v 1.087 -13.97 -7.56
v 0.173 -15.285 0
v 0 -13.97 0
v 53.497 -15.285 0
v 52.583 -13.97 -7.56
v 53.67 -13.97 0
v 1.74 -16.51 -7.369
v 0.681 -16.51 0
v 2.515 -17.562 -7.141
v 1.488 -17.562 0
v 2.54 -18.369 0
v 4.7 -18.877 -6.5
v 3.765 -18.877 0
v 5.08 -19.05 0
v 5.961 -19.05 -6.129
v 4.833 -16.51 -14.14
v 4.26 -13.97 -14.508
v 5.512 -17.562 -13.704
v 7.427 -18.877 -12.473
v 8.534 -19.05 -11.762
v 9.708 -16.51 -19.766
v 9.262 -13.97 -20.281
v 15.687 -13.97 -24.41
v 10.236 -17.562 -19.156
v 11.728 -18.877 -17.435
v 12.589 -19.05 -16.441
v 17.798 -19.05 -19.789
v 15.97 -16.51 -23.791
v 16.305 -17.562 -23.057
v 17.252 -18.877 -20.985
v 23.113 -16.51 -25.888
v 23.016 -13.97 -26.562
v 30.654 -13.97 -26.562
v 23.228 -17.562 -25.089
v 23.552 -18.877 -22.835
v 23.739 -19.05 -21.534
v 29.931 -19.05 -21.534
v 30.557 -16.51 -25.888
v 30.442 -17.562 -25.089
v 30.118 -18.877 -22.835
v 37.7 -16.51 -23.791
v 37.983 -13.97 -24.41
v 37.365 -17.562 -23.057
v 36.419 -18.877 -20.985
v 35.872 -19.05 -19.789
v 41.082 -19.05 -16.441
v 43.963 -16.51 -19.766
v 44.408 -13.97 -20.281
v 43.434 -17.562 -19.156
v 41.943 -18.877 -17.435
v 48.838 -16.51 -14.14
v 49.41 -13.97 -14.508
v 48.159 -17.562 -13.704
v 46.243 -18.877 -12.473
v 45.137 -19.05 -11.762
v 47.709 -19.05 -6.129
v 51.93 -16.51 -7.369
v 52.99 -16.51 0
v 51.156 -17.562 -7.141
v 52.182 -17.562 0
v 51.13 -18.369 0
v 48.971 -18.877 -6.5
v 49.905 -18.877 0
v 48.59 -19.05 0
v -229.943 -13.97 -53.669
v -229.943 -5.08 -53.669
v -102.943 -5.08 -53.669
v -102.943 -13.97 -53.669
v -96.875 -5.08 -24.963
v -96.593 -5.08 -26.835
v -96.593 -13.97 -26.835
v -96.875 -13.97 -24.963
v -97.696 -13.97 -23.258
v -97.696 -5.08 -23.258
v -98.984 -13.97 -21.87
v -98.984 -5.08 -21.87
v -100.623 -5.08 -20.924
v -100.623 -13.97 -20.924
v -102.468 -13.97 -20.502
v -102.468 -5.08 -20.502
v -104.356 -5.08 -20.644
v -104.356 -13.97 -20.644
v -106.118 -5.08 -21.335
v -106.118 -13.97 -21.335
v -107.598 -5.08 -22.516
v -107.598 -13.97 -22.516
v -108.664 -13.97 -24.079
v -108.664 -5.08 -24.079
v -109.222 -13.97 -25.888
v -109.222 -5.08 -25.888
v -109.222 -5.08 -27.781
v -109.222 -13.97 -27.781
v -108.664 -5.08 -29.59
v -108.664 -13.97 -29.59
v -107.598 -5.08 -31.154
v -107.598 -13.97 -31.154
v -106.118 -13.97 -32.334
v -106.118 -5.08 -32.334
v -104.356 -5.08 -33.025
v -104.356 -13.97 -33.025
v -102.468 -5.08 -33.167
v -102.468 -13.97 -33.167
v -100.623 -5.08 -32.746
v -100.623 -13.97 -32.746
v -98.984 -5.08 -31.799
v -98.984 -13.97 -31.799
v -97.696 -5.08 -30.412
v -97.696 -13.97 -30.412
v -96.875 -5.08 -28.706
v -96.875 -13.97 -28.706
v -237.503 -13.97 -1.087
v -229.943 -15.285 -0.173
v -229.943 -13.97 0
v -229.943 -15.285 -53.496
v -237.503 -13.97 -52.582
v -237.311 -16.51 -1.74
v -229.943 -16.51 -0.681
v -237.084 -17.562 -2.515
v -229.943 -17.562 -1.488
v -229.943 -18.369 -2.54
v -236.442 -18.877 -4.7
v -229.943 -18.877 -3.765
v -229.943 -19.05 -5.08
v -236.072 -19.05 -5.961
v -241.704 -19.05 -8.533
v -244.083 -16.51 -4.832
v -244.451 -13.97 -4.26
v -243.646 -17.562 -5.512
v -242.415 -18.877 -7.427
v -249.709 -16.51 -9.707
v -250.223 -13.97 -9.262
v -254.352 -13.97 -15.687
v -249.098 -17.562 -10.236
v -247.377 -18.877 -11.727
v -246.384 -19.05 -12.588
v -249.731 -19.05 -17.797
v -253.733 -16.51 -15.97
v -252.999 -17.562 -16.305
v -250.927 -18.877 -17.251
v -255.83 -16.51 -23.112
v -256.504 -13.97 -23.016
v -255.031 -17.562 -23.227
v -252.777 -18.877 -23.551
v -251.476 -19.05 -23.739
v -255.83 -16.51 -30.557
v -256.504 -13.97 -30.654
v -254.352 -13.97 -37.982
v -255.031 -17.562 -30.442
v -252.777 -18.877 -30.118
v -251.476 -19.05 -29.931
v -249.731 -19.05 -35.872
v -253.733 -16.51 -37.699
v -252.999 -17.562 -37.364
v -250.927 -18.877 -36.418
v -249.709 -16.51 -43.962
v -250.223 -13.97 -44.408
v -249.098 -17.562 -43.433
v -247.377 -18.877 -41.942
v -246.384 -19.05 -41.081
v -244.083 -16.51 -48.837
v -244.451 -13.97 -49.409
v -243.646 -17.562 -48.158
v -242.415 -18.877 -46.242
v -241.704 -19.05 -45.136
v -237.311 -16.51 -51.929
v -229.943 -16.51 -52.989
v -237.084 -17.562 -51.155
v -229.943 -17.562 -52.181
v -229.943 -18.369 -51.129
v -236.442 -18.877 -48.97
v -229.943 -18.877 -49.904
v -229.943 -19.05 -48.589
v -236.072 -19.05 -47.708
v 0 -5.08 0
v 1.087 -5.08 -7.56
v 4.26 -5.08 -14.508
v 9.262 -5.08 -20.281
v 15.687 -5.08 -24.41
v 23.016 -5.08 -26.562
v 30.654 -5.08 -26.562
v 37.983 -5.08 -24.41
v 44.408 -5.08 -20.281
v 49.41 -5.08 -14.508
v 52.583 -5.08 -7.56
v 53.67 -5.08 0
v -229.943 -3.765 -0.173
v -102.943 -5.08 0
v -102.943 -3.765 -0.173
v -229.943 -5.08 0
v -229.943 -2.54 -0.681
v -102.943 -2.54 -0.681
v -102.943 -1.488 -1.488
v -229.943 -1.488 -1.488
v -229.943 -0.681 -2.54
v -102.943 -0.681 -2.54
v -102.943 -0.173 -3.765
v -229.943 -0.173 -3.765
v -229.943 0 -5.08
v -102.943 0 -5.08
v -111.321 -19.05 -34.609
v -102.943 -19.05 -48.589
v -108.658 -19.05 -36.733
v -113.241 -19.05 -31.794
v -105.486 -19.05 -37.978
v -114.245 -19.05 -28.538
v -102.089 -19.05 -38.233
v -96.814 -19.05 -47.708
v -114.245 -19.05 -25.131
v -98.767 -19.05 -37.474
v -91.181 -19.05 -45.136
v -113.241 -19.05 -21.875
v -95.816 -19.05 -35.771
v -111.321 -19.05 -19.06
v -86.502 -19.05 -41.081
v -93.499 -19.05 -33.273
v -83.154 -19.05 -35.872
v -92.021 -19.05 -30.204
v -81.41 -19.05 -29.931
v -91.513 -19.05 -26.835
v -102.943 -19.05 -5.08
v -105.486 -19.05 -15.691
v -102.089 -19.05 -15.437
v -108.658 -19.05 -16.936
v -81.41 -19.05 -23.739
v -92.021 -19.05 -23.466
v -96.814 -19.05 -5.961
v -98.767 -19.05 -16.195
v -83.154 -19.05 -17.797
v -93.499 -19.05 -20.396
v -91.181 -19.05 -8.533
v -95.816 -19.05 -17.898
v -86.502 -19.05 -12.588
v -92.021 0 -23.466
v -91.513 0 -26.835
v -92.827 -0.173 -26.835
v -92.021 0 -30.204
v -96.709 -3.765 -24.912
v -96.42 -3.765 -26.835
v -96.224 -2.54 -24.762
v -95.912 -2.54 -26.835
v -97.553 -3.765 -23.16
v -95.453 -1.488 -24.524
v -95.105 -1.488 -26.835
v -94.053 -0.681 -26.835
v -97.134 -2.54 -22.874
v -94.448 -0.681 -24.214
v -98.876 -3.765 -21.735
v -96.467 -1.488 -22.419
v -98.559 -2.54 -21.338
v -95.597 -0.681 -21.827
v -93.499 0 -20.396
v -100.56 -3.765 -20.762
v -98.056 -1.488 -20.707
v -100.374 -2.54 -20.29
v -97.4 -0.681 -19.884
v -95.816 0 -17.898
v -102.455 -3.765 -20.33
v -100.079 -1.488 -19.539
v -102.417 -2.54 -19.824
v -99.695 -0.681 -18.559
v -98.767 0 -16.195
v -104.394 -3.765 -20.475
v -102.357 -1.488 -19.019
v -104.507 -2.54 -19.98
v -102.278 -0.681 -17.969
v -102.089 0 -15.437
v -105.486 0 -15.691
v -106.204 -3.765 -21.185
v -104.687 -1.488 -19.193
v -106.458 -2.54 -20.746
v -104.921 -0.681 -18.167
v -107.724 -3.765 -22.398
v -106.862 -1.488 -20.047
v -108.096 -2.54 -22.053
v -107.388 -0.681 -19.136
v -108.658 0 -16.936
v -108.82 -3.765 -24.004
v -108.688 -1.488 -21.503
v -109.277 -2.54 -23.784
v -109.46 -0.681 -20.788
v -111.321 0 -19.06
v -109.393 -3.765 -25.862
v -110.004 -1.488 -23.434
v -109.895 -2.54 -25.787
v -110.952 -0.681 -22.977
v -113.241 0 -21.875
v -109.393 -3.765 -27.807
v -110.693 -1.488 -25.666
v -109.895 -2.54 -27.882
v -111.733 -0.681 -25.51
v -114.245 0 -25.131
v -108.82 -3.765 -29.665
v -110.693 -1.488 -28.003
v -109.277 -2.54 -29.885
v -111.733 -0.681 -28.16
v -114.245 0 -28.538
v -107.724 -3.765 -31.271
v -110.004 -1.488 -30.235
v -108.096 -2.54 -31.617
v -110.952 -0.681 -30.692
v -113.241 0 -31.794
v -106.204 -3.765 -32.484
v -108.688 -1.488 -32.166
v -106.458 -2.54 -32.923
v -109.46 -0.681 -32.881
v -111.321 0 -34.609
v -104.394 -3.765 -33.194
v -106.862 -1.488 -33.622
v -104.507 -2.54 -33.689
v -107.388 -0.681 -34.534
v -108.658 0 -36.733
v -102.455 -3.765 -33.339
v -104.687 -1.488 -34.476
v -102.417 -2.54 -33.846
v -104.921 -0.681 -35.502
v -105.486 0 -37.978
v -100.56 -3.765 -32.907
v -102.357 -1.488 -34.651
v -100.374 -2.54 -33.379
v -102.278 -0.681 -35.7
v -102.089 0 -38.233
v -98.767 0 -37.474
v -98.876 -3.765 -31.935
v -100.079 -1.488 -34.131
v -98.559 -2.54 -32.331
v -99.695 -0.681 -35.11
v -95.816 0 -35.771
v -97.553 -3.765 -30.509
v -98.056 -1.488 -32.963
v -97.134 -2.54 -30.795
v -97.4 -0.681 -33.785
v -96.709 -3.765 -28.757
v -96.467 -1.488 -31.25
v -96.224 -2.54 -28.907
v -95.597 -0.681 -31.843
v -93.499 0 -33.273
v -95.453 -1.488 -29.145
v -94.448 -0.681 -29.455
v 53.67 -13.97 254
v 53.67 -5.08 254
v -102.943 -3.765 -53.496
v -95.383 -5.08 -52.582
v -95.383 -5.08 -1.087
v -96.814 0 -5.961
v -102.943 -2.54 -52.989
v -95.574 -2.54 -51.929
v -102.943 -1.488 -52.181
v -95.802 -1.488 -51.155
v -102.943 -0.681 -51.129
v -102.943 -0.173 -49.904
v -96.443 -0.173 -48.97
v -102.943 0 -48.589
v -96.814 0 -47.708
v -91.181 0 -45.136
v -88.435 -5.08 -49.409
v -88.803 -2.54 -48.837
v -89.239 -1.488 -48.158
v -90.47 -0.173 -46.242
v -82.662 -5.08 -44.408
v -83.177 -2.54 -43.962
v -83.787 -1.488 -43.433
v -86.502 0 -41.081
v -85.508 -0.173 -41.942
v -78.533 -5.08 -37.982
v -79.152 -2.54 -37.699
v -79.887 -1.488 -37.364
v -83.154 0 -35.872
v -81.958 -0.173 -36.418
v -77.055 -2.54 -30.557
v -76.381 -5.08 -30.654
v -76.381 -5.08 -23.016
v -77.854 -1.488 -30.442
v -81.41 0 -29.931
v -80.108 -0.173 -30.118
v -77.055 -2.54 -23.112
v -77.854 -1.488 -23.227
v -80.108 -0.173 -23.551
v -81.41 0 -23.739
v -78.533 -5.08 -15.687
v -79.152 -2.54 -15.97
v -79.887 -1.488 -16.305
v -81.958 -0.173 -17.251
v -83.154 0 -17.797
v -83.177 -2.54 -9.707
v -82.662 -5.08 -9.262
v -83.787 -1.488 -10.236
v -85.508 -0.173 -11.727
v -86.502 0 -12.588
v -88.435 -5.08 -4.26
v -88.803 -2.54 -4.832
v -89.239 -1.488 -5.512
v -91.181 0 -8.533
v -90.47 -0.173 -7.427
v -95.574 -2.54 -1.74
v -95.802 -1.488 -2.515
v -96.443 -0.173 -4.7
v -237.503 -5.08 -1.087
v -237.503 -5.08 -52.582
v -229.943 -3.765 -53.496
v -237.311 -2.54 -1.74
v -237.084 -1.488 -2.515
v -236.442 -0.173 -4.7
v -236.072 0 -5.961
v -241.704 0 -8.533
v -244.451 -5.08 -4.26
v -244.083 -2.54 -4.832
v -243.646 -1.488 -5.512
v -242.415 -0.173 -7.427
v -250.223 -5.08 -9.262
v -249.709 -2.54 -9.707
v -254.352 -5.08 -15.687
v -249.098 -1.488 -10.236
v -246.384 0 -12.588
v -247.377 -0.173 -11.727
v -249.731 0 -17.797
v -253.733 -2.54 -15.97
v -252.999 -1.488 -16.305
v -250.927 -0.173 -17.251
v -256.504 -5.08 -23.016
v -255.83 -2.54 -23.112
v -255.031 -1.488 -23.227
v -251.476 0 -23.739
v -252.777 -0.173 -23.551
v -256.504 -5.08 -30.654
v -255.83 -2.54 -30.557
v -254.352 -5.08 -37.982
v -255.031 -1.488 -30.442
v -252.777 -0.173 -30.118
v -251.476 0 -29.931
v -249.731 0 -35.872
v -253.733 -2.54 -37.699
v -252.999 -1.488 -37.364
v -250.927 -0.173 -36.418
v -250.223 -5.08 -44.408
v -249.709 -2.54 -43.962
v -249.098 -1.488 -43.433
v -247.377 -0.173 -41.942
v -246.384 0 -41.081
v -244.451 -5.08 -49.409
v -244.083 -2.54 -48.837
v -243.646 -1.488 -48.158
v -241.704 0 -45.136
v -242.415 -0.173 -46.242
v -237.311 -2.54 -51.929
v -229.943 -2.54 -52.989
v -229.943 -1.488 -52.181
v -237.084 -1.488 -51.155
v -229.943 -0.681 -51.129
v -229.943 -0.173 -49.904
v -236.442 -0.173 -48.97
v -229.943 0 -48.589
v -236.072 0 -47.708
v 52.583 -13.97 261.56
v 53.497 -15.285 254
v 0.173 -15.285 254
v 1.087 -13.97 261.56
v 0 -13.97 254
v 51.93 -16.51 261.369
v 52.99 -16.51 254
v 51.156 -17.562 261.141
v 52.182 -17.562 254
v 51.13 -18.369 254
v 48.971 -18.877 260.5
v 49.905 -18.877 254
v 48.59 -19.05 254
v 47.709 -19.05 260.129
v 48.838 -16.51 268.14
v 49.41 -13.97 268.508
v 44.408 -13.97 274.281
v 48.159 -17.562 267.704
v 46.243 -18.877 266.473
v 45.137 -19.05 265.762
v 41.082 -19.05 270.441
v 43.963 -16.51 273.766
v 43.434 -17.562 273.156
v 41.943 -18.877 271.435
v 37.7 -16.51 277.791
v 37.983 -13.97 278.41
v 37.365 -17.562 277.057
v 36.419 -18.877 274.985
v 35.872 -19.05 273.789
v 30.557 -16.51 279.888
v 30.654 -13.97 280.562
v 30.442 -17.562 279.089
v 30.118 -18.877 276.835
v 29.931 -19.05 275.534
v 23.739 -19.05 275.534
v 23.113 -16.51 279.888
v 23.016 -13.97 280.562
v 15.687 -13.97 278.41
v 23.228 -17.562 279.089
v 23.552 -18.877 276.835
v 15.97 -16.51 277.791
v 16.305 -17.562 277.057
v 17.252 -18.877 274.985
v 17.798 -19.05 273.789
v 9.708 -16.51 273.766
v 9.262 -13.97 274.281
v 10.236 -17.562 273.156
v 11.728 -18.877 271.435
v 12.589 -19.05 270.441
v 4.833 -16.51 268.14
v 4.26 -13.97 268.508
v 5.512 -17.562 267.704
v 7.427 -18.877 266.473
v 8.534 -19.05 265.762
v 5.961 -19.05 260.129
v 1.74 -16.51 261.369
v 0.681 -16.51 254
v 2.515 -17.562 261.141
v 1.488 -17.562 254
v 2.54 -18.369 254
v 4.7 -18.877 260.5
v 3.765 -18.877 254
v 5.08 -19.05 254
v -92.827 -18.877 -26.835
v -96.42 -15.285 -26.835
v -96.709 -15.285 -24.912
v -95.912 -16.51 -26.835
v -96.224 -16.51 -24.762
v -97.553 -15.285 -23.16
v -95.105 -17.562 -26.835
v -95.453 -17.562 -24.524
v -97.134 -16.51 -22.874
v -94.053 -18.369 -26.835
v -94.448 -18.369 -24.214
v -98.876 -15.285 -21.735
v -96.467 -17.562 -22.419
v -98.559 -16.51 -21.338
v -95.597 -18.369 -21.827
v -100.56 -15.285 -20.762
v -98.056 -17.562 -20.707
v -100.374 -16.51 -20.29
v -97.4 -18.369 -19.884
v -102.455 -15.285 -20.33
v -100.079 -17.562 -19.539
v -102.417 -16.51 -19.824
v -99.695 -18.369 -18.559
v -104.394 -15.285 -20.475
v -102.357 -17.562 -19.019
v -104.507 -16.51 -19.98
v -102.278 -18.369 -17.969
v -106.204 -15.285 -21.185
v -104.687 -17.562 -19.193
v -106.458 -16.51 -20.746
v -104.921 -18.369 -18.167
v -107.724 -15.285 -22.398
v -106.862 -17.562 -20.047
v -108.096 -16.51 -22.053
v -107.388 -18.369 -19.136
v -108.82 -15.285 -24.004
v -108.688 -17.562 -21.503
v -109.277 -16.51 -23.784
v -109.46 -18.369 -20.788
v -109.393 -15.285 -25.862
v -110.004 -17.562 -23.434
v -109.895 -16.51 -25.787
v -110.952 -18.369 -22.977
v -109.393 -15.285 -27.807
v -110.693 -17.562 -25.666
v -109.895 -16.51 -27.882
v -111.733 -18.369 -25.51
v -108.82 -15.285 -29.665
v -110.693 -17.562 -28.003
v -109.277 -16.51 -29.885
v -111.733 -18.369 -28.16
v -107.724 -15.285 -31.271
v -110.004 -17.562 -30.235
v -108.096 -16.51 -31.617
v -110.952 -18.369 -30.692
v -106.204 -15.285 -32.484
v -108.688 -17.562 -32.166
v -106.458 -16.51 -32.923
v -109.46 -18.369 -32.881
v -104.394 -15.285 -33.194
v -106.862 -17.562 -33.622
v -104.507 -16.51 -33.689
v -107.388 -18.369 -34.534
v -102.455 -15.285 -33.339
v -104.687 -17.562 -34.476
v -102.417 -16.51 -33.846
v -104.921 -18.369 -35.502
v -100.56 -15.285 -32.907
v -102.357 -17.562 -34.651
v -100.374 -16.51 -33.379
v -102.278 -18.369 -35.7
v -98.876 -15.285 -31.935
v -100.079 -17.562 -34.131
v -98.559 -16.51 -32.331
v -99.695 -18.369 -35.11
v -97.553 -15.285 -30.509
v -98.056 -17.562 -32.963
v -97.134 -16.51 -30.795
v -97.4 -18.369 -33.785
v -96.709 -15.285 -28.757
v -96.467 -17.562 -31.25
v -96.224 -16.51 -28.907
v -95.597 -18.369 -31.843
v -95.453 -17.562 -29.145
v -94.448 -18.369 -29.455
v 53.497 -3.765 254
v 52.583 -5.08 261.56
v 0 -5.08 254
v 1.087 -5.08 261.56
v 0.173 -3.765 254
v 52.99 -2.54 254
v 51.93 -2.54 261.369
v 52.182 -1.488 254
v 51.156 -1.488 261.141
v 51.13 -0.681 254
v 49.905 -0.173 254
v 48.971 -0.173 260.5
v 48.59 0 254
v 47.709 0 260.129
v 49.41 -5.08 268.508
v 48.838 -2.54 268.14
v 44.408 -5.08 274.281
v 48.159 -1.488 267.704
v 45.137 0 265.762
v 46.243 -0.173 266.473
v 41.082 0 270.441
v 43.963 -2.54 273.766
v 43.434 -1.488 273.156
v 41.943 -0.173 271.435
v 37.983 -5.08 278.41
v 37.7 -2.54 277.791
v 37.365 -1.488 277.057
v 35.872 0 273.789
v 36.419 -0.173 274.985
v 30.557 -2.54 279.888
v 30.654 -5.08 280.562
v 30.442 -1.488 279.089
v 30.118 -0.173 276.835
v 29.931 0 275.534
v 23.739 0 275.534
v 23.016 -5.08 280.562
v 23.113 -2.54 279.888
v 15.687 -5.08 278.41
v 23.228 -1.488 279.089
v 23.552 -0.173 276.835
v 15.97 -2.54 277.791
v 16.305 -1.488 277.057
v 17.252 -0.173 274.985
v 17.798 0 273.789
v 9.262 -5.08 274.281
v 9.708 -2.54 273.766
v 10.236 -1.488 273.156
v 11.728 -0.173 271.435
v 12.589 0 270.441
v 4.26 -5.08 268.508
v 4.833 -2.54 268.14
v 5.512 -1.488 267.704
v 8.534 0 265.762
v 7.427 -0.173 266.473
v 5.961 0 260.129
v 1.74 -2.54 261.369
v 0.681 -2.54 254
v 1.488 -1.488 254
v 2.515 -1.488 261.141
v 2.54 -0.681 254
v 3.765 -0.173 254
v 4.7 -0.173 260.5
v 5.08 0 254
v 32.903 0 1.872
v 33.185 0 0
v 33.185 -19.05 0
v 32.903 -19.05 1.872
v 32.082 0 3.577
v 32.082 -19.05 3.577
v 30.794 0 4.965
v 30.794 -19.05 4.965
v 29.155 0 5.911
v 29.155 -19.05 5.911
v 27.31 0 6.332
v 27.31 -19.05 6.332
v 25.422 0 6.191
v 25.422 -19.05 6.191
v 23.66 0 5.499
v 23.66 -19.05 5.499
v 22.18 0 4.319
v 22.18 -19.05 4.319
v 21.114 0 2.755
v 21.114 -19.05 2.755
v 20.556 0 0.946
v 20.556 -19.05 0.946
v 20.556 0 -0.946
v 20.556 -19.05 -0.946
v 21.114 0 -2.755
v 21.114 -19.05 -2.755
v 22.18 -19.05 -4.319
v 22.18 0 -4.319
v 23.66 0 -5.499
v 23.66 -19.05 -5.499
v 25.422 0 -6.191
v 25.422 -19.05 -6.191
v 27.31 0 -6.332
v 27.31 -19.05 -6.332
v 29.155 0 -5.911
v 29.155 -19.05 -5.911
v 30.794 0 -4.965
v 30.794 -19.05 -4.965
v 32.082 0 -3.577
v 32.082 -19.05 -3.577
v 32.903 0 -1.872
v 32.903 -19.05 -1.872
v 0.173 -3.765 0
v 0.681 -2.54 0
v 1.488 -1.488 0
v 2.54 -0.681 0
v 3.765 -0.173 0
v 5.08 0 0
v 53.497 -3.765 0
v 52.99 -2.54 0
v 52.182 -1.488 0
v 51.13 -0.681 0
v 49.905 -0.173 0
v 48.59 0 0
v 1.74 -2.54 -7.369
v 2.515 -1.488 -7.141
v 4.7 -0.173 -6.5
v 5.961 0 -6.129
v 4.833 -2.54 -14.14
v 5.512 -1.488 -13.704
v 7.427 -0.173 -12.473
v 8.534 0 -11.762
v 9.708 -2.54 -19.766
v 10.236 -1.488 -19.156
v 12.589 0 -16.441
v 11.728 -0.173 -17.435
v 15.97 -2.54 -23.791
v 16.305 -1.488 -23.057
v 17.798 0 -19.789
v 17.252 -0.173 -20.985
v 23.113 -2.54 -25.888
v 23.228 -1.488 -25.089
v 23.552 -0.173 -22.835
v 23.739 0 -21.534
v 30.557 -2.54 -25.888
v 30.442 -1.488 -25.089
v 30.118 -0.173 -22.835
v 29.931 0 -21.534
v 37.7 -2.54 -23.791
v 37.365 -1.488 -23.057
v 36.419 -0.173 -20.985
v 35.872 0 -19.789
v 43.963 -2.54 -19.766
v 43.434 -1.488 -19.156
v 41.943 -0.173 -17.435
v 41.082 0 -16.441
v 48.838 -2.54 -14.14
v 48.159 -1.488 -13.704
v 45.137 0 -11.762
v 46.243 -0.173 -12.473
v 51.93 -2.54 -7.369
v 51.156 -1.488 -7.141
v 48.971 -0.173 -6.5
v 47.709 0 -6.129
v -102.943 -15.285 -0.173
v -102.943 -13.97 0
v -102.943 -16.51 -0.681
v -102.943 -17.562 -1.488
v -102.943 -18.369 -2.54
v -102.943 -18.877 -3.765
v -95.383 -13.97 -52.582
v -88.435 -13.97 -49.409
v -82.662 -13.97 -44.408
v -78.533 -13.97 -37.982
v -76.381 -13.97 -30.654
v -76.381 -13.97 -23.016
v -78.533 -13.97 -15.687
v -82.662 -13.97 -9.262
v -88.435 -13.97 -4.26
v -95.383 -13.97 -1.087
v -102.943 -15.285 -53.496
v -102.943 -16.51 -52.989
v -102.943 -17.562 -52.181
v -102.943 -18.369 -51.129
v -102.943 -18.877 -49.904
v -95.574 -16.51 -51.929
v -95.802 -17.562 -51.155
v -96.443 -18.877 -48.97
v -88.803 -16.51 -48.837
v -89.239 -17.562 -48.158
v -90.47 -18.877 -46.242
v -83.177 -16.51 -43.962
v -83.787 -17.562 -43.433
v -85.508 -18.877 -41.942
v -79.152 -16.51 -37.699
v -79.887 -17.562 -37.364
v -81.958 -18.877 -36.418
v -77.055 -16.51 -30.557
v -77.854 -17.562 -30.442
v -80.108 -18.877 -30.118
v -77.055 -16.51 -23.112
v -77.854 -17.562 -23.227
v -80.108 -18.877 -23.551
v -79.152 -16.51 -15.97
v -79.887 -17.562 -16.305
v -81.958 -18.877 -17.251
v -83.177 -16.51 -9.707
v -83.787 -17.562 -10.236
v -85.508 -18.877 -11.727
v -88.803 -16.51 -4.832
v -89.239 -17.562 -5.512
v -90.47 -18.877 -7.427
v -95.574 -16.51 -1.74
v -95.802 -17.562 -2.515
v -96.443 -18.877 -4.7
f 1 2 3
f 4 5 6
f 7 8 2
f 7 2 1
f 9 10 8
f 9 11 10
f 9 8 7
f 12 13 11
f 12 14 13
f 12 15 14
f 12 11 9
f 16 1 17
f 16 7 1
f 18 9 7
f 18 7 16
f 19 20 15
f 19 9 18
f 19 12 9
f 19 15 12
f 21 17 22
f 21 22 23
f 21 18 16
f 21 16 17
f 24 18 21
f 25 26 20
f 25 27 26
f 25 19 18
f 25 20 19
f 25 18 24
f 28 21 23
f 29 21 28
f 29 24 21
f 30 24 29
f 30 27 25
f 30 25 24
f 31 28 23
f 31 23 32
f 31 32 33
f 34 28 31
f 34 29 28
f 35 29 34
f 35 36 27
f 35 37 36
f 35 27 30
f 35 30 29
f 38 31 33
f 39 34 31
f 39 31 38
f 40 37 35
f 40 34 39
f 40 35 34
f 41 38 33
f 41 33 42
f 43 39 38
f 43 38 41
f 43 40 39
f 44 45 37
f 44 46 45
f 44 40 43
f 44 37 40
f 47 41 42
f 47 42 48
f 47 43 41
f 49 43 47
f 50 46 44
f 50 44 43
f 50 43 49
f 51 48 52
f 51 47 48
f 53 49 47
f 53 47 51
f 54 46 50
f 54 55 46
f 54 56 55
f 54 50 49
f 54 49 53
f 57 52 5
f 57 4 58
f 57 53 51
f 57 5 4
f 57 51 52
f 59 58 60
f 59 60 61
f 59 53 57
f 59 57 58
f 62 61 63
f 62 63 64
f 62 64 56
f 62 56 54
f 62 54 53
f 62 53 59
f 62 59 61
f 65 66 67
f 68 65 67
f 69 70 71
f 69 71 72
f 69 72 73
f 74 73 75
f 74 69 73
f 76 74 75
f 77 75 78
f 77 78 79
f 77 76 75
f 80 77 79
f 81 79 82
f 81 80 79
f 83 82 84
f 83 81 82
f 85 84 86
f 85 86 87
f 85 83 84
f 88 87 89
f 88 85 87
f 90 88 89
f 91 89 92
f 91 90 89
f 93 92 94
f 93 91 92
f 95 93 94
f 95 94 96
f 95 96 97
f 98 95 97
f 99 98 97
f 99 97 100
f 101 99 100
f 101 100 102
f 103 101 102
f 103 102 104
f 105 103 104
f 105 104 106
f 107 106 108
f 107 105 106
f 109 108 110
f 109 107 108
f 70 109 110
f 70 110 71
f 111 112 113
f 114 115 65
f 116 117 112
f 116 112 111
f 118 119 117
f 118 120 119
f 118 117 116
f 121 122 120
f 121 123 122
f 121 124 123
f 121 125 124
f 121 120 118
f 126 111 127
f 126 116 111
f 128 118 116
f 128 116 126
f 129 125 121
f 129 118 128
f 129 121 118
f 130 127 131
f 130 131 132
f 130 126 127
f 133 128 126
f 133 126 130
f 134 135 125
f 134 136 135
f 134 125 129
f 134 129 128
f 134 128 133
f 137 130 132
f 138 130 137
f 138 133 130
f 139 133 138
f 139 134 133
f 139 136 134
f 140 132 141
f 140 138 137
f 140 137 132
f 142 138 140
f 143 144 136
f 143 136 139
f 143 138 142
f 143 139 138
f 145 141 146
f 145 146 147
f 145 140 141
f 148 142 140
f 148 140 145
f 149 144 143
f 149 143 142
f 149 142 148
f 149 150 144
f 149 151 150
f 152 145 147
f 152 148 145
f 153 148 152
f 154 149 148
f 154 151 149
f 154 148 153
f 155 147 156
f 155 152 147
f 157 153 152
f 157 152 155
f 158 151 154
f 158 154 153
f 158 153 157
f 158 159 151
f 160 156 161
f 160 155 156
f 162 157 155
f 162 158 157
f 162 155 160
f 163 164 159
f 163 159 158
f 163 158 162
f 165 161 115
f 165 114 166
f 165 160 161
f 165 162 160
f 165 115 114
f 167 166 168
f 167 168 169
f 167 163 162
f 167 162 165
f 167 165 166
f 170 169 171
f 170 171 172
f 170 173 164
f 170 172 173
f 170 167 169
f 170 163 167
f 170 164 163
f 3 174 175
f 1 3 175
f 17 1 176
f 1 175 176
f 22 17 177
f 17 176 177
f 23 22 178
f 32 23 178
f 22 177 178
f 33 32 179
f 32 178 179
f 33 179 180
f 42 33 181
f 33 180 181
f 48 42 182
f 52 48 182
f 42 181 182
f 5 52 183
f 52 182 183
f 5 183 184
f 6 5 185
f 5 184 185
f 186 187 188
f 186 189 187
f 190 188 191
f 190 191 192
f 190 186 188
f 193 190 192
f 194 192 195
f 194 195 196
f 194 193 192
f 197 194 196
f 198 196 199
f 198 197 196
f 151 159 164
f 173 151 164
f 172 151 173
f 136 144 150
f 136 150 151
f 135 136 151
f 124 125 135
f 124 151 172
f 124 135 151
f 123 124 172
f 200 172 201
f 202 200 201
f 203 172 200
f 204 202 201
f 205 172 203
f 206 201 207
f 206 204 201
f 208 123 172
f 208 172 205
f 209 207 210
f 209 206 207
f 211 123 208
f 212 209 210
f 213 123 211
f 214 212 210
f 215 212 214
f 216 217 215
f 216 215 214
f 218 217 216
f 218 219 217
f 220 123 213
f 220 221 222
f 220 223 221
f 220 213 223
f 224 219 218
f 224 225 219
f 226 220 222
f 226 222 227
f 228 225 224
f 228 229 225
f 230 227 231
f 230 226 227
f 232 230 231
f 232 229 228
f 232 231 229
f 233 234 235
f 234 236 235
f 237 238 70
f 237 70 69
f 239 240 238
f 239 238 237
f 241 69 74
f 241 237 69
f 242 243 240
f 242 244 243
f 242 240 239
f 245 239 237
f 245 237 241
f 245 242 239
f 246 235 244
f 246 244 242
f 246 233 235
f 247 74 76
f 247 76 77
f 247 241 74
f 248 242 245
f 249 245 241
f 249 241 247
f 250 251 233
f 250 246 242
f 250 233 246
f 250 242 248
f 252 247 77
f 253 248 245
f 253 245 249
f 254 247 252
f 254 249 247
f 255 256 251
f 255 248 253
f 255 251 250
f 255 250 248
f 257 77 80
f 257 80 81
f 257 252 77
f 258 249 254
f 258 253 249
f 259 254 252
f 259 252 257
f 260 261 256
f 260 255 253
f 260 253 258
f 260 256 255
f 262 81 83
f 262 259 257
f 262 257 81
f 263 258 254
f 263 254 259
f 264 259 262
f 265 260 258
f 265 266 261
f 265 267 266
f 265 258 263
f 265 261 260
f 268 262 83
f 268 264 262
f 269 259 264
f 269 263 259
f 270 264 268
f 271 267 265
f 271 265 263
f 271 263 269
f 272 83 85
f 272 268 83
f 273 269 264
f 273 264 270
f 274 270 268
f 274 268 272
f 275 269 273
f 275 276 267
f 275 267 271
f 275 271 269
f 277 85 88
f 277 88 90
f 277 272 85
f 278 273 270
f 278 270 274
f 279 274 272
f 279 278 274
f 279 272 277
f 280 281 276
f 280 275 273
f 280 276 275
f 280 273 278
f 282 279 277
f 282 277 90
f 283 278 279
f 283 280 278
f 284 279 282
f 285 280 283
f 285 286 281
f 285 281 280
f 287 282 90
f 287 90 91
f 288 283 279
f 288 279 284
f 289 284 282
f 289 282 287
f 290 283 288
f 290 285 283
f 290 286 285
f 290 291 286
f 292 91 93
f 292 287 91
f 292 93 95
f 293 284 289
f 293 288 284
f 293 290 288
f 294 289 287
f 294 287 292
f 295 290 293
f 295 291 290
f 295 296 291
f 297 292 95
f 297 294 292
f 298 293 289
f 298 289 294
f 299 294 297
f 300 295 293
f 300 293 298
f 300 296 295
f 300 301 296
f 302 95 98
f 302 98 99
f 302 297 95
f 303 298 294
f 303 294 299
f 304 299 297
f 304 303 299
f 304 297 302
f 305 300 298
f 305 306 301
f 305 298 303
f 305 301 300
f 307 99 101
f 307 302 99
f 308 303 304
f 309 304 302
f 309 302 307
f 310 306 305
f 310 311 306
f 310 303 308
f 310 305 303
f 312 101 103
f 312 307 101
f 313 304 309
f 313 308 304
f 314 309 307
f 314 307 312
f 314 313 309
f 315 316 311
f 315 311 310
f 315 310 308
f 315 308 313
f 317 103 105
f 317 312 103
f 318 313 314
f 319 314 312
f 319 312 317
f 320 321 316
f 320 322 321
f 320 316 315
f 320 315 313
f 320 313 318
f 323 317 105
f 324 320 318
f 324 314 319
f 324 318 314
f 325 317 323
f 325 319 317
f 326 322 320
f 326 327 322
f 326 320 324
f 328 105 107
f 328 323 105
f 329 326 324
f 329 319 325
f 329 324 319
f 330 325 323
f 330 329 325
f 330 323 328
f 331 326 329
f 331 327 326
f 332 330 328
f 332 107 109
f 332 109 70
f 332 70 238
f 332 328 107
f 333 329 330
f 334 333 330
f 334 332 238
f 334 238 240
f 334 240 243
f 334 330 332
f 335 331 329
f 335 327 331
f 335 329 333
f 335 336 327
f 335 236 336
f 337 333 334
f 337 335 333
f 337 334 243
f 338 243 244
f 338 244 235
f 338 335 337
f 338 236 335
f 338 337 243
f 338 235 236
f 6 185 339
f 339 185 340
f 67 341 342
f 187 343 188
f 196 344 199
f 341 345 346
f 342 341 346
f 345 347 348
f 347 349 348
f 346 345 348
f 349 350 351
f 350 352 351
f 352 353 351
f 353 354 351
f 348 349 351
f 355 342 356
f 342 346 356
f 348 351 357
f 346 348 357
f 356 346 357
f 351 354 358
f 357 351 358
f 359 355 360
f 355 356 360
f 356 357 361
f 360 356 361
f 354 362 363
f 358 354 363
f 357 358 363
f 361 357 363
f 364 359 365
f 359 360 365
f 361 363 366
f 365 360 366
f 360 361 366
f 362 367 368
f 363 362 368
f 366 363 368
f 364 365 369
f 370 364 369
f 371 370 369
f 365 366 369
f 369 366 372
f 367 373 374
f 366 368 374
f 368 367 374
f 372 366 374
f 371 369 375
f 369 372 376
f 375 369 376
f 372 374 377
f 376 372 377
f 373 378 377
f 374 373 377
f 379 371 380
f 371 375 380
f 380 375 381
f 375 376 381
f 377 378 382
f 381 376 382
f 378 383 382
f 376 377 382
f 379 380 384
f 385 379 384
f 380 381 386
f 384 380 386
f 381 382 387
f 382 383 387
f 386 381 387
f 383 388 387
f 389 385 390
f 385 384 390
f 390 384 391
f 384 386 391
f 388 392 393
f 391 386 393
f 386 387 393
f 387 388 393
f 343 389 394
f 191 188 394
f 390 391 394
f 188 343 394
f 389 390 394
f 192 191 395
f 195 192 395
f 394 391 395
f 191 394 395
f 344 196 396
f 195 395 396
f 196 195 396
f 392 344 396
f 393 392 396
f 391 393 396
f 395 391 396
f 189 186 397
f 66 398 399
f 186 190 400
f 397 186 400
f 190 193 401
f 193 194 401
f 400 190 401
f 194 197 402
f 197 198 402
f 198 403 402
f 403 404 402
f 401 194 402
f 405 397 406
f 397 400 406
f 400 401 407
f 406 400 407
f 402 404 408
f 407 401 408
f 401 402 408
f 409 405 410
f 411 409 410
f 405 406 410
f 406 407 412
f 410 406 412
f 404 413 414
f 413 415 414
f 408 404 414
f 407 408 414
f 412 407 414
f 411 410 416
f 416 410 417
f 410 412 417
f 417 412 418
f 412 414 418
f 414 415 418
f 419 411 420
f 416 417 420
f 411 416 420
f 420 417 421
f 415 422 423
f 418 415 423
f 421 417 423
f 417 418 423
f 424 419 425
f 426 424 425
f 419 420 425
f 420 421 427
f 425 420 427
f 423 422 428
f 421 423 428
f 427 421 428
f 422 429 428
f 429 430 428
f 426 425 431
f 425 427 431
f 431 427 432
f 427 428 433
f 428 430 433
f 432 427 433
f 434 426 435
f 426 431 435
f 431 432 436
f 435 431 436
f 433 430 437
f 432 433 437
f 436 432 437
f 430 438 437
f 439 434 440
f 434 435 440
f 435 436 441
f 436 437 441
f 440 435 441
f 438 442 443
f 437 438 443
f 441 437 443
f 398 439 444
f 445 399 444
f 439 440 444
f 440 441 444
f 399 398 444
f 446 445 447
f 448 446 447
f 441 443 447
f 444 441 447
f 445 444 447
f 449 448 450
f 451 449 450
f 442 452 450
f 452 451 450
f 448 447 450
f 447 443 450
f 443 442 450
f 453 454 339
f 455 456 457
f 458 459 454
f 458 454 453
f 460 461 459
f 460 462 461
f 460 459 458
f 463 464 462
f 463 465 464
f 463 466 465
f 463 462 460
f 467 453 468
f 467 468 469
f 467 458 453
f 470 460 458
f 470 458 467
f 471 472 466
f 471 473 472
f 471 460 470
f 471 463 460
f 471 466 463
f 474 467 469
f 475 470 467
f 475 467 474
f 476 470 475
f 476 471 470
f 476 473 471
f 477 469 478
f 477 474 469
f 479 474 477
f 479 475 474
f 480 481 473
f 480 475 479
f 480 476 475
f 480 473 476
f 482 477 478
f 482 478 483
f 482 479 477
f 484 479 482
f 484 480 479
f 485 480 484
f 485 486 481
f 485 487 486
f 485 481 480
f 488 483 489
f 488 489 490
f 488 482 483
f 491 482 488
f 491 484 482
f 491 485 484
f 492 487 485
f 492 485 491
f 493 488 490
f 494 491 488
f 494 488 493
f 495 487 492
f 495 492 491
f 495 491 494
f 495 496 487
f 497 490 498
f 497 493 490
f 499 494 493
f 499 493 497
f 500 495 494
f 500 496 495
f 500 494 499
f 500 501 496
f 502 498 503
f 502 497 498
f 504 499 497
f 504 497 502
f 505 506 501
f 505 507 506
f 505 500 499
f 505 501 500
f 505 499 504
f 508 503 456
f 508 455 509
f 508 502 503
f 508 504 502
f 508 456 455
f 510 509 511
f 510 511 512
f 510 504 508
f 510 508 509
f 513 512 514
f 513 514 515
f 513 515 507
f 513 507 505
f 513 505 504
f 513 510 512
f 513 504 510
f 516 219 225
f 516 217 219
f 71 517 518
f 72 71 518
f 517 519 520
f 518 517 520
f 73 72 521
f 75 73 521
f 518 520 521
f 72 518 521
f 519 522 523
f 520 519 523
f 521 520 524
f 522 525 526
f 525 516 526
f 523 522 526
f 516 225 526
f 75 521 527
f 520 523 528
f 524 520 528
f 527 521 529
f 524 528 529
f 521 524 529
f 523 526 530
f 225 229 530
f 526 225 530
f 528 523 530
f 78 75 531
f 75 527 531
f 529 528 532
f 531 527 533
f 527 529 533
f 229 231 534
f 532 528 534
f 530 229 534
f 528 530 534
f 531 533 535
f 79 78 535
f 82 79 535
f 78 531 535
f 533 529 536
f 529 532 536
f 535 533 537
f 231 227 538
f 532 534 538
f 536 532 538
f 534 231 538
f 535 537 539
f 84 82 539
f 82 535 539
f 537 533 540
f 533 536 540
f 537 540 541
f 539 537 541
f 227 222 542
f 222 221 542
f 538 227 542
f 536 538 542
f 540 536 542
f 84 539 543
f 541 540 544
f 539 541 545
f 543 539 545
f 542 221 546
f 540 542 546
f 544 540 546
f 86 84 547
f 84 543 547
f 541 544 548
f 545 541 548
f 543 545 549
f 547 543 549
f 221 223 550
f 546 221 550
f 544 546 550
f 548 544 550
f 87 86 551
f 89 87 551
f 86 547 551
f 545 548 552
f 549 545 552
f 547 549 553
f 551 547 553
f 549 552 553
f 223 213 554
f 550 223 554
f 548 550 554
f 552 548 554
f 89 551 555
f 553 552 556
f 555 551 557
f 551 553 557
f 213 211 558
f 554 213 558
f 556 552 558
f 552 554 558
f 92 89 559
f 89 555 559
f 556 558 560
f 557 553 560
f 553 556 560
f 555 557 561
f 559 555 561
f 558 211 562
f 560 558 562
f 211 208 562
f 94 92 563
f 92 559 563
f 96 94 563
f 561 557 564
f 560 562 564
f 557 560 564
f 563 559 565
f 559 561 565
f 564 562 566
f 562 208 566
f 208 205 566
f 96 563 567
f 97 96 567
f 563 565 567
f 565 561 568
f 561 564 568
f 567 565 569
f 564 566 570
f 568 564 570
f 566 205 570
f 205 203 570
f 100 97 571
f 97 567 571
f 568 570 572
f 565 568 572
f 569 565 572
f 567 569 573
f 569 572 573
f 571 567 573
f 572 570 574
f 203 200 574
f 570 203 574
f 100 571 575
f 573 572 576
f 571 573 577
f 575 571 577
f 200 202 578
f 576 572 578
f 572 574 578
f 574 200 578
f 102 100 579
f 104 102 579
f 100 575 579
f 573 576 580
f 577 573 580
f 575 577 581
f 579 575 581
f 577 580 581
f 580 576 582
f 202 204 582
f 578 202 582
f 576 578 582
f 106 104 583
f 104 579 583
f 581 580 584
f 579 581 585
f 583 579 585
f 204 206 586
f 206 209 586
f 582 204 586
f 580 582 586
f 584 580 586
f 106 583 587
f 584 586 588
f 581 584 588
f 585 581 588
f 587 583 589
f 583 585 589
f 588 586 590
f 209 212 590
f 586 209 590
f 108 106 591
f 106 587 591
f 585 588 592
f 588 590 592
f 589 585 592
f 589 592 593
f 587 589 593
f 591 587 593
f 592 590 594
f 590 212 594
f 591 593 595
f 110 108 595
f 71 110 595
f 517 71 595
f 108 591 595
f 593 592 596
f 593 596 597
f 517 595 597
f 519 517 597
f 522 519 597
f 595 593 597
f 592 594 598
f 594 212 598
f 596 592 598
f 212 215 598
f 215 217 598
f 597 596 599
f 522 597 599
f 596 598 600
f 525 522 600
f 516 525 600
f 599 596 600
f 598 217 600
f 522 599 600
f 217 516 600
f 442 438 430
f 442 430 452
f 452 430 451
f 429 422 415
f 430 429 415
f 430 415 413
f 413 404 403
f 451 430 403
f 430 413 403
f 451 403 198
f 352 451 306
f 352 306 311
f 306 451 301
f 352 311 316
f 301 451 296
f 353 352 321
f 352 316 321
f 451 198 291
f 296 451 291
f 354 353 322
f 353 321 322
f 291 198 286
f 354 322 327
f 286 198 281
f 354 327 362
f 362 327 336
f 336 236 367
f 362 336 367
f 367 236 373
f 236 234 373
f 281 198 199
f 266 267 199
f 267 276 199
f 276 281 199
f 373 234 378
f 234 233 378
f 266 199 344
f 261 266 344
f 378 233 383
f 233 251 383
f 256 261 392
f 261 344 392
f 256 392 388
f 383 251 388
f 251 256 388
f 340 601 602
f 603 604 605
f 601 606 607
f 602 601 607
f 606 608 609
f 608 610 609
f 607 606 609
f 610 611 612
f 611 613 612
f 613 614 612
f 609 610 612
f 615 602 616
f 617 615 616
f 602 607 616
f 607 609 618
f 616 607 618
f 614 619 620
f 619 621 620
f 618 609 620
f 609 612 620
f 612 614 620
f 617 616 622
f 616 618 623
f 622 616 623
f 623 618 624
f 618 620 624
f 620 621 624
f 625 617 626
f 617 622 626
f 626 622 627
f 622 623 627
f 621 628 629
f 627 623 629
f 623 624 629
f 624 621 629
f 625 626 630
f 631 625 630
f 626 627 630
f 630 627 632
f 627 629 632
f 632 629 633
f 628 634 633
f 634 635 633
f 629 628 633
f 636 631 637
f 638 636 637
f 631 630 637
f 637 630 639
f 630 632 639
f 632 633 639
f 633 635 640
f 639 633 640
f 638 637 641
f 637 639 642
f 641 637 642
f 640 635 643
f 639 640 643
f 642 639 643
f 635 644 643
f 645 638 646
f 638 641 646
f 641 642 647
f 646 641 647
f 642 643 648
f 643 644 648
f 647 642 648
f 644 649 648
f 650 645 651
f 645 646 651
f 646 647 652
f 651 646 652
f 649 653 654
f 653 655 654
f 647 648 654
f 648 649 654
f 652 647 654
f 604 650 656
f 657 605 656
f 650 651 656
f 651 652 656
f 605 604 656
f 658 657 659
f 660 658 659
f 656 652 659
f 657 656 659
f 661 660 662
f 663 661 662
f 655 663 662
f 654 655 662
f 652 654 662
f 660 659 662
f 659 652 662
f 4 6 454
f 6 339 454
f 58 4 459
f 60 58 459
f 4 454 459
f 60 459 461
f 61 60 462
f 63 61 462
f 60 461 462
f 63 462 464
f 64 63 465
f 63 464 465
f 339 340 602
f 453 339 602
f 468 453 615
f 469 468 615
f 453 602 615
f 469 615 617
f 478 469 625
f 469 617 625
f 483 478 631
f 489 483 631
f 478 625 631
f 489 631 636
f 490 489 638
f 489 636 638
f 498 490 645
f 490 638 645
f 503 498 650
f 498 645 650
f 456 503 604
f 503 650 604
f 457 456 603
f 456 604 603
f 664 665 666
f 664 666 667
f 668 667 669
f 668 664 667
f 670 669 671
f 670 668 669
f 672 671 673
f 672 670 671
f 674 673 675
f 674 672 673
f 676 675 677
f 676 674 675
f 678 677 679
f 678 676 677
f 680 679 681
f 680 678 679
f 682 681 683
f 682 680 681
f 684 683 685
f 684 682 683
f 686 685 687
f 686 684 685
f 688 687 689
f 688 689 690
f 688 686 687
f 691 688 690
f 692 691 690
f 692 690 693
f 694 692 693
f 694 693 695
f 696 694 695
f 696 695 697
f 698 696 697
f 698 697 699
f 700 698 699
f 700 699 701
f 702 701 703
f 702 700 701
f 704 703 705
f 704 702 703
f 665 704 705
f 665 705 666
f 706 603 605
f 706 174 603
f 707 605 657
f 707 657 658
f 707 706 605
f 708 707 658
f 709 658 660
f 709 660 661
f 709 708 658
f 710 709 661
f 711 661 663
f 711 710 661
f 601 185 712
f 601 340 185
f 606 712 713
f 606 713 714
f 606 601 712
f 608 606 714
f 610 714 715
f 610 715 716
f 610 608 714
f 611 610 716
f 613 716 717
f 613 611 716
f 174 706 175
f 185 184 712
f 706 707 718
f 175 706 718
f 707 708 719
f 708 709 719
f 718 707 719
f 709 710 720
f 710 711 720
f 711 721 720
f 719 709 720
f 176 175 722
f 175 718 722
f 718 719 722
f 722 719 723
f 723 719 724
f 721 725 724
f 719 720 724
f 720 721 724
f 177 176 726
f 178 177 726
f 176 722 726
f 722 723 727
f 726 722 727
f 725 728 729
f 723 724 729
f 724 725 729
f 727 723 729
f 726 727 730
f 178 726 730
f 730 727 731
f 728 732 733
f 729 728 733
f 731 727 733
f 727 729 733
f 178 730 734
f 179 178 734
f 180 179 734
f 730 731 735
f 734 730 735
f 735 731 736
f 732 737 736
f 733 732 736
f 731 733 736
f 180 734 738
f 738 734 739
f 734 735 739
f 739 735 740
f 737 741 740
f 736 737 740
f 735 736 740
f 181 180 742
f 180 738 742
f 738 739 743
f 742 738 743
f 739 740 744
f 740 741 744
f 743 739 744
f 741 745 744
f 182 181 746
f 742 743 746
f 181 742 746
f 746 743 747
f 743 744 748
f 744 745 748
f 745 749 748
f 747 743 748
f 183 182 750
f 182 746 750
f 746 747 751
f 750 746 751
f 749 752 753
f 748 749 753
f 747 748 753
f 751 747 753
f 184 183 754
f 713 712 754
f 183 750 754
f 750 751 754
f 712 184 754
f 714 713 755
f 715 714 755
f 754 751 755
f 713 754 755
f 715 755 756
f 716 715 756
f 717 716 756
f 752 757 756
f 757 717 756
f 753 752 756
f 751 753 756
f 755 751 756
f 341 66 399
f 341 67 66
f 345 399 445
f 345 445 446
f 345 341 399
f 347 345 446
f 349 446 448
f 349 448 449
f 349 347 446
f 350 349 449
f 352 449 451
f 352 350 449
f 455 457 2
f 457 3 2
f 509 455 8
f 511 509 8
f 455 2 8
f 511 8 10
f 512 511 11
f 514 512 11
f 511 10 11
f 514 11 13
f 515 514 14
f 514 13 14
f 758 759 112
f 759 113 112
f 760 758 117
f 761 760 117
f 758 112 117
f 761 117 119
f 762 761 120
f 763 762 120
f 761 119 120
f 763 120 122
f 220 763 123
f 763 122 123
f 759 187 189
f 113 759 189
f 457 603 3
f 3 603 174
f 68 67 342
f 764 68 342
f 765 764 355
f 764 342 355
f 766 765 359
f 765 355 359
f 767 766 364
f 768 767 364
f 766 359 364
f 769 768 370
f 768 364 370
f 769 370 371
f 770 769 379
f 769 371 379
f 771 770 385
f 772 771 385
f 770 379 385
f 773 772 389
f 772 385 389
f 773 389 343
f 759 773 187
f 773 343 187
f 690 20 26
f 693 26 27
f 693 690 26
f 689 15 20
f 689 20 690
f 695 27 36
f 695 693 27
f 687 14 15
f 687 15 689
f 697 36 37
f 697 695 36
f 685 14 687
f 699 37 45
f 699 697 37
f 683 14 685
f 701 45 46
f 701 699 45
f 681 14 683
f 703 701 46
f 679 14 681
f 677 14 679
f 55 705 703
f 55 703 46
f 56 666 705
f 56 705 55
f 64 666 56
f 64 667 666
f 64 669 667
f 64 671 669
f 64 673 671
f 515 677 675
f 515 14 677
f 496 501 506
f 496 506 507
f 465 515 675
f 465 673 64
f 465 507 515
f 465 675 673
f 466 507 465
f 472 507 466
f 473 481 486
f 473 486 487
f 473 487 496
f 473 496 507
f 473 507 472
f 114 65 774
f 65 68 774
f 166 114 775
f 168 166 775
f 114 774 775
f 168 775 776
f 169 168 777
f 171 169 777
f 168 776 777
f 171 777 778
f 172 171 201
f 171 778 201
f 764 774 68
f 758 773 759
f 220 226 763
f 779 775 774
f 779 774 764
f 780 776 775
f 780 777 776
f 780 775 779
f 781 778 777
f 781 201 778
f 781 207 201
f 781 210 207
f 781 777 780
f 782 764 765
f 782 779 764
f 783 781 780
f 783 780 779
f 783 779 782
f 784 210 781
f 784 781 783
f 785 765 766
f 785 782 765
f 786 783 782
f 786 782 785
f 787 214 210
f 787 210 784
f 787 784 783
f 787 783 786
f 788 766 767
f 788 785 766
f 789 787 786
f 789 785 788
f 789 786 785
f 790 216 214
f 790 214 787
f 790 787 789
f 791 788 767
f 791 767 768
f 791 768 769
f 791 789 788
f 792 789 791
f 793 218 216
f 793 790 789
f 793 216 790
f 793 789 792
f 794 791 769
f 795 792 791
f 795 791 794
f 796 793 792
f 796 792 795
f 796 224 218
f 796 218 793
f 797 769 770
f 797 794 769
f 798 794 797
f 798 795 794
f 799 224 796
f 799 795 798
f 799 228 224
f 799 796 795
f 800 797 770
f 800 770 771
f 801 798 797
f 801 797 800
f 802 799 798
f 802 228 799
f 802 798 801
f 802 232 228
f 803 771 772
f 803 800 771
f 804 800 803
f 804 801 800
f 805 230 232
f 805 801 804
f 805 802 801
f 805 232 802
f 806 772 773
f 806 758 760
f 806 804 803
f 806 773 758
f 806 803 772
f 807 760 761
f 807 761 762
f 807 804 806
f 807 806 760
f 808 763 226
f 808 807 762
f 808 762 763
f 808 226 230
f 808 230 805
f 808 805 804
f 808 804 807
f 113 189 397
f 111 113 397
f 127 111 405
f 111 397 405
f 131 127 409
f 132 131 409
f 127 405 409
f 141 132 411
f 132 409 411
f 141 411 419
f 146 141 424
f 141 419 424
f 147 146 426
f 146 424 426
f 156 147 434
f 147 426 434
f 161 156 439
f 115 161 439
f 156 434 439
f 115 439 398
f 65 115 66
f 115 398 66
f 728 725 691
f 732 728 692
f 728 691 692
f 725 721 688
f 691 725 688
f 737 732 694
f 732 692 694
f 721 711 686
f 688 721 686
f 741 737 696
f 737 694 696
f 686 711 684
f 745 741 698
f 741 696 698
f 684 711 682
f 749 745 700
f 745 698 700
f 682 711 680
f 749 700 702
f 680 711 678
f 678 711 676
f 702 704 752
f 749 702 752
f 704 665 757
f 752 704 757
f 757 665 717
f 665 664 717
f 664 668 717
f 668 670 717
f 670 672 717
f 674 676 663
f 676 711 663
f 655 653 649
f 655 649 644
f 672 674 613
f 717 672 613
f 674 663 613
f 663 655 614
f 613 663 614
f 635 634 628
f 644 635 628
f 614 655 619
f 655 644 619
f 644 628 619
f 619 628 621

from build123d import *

# Parameters (mm, degrees)
F1_R     = 6.35
F2_DEPTH = 19.05
F0_R     = 6.35
F3_DEPTH = 19.05
F4_R     = 5.08
F5_R     = 5.08


with BuildPart() as f2:
    # F1 (on Front) → F2 (new body)
    with BuildSketch(Plane.XZ):
        with BuildLine():
            Line((-229.942699, -53.669194), (-102.942699, -53.669194))
            ThreePointArc((-102.942699, -53.669194), (-76.108102, -26.834597), (-102.942699, 0))
            Line((-102.942699, 0), (-229.942699, 0))
            ThreePointArc((-229.942699, 0), (-256.777295, -26.834597), (-229.942699, -53.669194))
        make_face()
        with Locations((-102.942699, -26.834597)):
            Circle(F1_R, mode=Mode.SUBTRACT)
    extrude(amount=F2_DEPTH)

    # F5
    f5_edges = [f2.edges().sort_by_distance(p)[0] for p in [
        (-256.777295, -19.05, -26.834597),
        (-166.442699, -19.05, -53.669194),
        (-76.108102, -19.05, -26.834597),
        (-166.442699, -19.05, 0),
        (-109.292699, -19.05, -26.834597),
        (-256.777295, 0, -26.834597),
        (-166.442699, 0, -53.669194),
        (-76.108102, 0, -26.834597),
        (-166.442699, 0, 0),
        (-109.292699, 0, -26.834597),
    ]]
    fillet(f5_edges, radius=F5_R)


with BuildPart() as f3:
    # F0 (on Front) → F3 (new body)
    with BuildSketch(Plane.XZ):
        with BuildLine():
            ThreePointArc((0, 0), (26.8351, -26.8351), (53.6702, 0))
            Line((53.6702, 0), (53.6702, 254))
            ThreePointArc((53.6702, 254), (26.8351, 280.8351), (0, 254))
            Line((0, 254), (0, 0))
        make_face()
        with Locations((26.8351, 0)):
            Circle(F0_R, mode=Mode.SUBTRACT)
    extrude(amount=F3_DEPTH)

    # F4
    f4_edges = [f3.edges().sort_by_distance(p)[0] for p in [
        (0, -19.05, 127),
        (53.6702, 0, 127),
        (53.6702, -19.05, 127),
        (0, 0, 127),
    ]]
    fillet(f4_edges, radius=F4_R)


solid = Compound([f2.part, f3.part])
